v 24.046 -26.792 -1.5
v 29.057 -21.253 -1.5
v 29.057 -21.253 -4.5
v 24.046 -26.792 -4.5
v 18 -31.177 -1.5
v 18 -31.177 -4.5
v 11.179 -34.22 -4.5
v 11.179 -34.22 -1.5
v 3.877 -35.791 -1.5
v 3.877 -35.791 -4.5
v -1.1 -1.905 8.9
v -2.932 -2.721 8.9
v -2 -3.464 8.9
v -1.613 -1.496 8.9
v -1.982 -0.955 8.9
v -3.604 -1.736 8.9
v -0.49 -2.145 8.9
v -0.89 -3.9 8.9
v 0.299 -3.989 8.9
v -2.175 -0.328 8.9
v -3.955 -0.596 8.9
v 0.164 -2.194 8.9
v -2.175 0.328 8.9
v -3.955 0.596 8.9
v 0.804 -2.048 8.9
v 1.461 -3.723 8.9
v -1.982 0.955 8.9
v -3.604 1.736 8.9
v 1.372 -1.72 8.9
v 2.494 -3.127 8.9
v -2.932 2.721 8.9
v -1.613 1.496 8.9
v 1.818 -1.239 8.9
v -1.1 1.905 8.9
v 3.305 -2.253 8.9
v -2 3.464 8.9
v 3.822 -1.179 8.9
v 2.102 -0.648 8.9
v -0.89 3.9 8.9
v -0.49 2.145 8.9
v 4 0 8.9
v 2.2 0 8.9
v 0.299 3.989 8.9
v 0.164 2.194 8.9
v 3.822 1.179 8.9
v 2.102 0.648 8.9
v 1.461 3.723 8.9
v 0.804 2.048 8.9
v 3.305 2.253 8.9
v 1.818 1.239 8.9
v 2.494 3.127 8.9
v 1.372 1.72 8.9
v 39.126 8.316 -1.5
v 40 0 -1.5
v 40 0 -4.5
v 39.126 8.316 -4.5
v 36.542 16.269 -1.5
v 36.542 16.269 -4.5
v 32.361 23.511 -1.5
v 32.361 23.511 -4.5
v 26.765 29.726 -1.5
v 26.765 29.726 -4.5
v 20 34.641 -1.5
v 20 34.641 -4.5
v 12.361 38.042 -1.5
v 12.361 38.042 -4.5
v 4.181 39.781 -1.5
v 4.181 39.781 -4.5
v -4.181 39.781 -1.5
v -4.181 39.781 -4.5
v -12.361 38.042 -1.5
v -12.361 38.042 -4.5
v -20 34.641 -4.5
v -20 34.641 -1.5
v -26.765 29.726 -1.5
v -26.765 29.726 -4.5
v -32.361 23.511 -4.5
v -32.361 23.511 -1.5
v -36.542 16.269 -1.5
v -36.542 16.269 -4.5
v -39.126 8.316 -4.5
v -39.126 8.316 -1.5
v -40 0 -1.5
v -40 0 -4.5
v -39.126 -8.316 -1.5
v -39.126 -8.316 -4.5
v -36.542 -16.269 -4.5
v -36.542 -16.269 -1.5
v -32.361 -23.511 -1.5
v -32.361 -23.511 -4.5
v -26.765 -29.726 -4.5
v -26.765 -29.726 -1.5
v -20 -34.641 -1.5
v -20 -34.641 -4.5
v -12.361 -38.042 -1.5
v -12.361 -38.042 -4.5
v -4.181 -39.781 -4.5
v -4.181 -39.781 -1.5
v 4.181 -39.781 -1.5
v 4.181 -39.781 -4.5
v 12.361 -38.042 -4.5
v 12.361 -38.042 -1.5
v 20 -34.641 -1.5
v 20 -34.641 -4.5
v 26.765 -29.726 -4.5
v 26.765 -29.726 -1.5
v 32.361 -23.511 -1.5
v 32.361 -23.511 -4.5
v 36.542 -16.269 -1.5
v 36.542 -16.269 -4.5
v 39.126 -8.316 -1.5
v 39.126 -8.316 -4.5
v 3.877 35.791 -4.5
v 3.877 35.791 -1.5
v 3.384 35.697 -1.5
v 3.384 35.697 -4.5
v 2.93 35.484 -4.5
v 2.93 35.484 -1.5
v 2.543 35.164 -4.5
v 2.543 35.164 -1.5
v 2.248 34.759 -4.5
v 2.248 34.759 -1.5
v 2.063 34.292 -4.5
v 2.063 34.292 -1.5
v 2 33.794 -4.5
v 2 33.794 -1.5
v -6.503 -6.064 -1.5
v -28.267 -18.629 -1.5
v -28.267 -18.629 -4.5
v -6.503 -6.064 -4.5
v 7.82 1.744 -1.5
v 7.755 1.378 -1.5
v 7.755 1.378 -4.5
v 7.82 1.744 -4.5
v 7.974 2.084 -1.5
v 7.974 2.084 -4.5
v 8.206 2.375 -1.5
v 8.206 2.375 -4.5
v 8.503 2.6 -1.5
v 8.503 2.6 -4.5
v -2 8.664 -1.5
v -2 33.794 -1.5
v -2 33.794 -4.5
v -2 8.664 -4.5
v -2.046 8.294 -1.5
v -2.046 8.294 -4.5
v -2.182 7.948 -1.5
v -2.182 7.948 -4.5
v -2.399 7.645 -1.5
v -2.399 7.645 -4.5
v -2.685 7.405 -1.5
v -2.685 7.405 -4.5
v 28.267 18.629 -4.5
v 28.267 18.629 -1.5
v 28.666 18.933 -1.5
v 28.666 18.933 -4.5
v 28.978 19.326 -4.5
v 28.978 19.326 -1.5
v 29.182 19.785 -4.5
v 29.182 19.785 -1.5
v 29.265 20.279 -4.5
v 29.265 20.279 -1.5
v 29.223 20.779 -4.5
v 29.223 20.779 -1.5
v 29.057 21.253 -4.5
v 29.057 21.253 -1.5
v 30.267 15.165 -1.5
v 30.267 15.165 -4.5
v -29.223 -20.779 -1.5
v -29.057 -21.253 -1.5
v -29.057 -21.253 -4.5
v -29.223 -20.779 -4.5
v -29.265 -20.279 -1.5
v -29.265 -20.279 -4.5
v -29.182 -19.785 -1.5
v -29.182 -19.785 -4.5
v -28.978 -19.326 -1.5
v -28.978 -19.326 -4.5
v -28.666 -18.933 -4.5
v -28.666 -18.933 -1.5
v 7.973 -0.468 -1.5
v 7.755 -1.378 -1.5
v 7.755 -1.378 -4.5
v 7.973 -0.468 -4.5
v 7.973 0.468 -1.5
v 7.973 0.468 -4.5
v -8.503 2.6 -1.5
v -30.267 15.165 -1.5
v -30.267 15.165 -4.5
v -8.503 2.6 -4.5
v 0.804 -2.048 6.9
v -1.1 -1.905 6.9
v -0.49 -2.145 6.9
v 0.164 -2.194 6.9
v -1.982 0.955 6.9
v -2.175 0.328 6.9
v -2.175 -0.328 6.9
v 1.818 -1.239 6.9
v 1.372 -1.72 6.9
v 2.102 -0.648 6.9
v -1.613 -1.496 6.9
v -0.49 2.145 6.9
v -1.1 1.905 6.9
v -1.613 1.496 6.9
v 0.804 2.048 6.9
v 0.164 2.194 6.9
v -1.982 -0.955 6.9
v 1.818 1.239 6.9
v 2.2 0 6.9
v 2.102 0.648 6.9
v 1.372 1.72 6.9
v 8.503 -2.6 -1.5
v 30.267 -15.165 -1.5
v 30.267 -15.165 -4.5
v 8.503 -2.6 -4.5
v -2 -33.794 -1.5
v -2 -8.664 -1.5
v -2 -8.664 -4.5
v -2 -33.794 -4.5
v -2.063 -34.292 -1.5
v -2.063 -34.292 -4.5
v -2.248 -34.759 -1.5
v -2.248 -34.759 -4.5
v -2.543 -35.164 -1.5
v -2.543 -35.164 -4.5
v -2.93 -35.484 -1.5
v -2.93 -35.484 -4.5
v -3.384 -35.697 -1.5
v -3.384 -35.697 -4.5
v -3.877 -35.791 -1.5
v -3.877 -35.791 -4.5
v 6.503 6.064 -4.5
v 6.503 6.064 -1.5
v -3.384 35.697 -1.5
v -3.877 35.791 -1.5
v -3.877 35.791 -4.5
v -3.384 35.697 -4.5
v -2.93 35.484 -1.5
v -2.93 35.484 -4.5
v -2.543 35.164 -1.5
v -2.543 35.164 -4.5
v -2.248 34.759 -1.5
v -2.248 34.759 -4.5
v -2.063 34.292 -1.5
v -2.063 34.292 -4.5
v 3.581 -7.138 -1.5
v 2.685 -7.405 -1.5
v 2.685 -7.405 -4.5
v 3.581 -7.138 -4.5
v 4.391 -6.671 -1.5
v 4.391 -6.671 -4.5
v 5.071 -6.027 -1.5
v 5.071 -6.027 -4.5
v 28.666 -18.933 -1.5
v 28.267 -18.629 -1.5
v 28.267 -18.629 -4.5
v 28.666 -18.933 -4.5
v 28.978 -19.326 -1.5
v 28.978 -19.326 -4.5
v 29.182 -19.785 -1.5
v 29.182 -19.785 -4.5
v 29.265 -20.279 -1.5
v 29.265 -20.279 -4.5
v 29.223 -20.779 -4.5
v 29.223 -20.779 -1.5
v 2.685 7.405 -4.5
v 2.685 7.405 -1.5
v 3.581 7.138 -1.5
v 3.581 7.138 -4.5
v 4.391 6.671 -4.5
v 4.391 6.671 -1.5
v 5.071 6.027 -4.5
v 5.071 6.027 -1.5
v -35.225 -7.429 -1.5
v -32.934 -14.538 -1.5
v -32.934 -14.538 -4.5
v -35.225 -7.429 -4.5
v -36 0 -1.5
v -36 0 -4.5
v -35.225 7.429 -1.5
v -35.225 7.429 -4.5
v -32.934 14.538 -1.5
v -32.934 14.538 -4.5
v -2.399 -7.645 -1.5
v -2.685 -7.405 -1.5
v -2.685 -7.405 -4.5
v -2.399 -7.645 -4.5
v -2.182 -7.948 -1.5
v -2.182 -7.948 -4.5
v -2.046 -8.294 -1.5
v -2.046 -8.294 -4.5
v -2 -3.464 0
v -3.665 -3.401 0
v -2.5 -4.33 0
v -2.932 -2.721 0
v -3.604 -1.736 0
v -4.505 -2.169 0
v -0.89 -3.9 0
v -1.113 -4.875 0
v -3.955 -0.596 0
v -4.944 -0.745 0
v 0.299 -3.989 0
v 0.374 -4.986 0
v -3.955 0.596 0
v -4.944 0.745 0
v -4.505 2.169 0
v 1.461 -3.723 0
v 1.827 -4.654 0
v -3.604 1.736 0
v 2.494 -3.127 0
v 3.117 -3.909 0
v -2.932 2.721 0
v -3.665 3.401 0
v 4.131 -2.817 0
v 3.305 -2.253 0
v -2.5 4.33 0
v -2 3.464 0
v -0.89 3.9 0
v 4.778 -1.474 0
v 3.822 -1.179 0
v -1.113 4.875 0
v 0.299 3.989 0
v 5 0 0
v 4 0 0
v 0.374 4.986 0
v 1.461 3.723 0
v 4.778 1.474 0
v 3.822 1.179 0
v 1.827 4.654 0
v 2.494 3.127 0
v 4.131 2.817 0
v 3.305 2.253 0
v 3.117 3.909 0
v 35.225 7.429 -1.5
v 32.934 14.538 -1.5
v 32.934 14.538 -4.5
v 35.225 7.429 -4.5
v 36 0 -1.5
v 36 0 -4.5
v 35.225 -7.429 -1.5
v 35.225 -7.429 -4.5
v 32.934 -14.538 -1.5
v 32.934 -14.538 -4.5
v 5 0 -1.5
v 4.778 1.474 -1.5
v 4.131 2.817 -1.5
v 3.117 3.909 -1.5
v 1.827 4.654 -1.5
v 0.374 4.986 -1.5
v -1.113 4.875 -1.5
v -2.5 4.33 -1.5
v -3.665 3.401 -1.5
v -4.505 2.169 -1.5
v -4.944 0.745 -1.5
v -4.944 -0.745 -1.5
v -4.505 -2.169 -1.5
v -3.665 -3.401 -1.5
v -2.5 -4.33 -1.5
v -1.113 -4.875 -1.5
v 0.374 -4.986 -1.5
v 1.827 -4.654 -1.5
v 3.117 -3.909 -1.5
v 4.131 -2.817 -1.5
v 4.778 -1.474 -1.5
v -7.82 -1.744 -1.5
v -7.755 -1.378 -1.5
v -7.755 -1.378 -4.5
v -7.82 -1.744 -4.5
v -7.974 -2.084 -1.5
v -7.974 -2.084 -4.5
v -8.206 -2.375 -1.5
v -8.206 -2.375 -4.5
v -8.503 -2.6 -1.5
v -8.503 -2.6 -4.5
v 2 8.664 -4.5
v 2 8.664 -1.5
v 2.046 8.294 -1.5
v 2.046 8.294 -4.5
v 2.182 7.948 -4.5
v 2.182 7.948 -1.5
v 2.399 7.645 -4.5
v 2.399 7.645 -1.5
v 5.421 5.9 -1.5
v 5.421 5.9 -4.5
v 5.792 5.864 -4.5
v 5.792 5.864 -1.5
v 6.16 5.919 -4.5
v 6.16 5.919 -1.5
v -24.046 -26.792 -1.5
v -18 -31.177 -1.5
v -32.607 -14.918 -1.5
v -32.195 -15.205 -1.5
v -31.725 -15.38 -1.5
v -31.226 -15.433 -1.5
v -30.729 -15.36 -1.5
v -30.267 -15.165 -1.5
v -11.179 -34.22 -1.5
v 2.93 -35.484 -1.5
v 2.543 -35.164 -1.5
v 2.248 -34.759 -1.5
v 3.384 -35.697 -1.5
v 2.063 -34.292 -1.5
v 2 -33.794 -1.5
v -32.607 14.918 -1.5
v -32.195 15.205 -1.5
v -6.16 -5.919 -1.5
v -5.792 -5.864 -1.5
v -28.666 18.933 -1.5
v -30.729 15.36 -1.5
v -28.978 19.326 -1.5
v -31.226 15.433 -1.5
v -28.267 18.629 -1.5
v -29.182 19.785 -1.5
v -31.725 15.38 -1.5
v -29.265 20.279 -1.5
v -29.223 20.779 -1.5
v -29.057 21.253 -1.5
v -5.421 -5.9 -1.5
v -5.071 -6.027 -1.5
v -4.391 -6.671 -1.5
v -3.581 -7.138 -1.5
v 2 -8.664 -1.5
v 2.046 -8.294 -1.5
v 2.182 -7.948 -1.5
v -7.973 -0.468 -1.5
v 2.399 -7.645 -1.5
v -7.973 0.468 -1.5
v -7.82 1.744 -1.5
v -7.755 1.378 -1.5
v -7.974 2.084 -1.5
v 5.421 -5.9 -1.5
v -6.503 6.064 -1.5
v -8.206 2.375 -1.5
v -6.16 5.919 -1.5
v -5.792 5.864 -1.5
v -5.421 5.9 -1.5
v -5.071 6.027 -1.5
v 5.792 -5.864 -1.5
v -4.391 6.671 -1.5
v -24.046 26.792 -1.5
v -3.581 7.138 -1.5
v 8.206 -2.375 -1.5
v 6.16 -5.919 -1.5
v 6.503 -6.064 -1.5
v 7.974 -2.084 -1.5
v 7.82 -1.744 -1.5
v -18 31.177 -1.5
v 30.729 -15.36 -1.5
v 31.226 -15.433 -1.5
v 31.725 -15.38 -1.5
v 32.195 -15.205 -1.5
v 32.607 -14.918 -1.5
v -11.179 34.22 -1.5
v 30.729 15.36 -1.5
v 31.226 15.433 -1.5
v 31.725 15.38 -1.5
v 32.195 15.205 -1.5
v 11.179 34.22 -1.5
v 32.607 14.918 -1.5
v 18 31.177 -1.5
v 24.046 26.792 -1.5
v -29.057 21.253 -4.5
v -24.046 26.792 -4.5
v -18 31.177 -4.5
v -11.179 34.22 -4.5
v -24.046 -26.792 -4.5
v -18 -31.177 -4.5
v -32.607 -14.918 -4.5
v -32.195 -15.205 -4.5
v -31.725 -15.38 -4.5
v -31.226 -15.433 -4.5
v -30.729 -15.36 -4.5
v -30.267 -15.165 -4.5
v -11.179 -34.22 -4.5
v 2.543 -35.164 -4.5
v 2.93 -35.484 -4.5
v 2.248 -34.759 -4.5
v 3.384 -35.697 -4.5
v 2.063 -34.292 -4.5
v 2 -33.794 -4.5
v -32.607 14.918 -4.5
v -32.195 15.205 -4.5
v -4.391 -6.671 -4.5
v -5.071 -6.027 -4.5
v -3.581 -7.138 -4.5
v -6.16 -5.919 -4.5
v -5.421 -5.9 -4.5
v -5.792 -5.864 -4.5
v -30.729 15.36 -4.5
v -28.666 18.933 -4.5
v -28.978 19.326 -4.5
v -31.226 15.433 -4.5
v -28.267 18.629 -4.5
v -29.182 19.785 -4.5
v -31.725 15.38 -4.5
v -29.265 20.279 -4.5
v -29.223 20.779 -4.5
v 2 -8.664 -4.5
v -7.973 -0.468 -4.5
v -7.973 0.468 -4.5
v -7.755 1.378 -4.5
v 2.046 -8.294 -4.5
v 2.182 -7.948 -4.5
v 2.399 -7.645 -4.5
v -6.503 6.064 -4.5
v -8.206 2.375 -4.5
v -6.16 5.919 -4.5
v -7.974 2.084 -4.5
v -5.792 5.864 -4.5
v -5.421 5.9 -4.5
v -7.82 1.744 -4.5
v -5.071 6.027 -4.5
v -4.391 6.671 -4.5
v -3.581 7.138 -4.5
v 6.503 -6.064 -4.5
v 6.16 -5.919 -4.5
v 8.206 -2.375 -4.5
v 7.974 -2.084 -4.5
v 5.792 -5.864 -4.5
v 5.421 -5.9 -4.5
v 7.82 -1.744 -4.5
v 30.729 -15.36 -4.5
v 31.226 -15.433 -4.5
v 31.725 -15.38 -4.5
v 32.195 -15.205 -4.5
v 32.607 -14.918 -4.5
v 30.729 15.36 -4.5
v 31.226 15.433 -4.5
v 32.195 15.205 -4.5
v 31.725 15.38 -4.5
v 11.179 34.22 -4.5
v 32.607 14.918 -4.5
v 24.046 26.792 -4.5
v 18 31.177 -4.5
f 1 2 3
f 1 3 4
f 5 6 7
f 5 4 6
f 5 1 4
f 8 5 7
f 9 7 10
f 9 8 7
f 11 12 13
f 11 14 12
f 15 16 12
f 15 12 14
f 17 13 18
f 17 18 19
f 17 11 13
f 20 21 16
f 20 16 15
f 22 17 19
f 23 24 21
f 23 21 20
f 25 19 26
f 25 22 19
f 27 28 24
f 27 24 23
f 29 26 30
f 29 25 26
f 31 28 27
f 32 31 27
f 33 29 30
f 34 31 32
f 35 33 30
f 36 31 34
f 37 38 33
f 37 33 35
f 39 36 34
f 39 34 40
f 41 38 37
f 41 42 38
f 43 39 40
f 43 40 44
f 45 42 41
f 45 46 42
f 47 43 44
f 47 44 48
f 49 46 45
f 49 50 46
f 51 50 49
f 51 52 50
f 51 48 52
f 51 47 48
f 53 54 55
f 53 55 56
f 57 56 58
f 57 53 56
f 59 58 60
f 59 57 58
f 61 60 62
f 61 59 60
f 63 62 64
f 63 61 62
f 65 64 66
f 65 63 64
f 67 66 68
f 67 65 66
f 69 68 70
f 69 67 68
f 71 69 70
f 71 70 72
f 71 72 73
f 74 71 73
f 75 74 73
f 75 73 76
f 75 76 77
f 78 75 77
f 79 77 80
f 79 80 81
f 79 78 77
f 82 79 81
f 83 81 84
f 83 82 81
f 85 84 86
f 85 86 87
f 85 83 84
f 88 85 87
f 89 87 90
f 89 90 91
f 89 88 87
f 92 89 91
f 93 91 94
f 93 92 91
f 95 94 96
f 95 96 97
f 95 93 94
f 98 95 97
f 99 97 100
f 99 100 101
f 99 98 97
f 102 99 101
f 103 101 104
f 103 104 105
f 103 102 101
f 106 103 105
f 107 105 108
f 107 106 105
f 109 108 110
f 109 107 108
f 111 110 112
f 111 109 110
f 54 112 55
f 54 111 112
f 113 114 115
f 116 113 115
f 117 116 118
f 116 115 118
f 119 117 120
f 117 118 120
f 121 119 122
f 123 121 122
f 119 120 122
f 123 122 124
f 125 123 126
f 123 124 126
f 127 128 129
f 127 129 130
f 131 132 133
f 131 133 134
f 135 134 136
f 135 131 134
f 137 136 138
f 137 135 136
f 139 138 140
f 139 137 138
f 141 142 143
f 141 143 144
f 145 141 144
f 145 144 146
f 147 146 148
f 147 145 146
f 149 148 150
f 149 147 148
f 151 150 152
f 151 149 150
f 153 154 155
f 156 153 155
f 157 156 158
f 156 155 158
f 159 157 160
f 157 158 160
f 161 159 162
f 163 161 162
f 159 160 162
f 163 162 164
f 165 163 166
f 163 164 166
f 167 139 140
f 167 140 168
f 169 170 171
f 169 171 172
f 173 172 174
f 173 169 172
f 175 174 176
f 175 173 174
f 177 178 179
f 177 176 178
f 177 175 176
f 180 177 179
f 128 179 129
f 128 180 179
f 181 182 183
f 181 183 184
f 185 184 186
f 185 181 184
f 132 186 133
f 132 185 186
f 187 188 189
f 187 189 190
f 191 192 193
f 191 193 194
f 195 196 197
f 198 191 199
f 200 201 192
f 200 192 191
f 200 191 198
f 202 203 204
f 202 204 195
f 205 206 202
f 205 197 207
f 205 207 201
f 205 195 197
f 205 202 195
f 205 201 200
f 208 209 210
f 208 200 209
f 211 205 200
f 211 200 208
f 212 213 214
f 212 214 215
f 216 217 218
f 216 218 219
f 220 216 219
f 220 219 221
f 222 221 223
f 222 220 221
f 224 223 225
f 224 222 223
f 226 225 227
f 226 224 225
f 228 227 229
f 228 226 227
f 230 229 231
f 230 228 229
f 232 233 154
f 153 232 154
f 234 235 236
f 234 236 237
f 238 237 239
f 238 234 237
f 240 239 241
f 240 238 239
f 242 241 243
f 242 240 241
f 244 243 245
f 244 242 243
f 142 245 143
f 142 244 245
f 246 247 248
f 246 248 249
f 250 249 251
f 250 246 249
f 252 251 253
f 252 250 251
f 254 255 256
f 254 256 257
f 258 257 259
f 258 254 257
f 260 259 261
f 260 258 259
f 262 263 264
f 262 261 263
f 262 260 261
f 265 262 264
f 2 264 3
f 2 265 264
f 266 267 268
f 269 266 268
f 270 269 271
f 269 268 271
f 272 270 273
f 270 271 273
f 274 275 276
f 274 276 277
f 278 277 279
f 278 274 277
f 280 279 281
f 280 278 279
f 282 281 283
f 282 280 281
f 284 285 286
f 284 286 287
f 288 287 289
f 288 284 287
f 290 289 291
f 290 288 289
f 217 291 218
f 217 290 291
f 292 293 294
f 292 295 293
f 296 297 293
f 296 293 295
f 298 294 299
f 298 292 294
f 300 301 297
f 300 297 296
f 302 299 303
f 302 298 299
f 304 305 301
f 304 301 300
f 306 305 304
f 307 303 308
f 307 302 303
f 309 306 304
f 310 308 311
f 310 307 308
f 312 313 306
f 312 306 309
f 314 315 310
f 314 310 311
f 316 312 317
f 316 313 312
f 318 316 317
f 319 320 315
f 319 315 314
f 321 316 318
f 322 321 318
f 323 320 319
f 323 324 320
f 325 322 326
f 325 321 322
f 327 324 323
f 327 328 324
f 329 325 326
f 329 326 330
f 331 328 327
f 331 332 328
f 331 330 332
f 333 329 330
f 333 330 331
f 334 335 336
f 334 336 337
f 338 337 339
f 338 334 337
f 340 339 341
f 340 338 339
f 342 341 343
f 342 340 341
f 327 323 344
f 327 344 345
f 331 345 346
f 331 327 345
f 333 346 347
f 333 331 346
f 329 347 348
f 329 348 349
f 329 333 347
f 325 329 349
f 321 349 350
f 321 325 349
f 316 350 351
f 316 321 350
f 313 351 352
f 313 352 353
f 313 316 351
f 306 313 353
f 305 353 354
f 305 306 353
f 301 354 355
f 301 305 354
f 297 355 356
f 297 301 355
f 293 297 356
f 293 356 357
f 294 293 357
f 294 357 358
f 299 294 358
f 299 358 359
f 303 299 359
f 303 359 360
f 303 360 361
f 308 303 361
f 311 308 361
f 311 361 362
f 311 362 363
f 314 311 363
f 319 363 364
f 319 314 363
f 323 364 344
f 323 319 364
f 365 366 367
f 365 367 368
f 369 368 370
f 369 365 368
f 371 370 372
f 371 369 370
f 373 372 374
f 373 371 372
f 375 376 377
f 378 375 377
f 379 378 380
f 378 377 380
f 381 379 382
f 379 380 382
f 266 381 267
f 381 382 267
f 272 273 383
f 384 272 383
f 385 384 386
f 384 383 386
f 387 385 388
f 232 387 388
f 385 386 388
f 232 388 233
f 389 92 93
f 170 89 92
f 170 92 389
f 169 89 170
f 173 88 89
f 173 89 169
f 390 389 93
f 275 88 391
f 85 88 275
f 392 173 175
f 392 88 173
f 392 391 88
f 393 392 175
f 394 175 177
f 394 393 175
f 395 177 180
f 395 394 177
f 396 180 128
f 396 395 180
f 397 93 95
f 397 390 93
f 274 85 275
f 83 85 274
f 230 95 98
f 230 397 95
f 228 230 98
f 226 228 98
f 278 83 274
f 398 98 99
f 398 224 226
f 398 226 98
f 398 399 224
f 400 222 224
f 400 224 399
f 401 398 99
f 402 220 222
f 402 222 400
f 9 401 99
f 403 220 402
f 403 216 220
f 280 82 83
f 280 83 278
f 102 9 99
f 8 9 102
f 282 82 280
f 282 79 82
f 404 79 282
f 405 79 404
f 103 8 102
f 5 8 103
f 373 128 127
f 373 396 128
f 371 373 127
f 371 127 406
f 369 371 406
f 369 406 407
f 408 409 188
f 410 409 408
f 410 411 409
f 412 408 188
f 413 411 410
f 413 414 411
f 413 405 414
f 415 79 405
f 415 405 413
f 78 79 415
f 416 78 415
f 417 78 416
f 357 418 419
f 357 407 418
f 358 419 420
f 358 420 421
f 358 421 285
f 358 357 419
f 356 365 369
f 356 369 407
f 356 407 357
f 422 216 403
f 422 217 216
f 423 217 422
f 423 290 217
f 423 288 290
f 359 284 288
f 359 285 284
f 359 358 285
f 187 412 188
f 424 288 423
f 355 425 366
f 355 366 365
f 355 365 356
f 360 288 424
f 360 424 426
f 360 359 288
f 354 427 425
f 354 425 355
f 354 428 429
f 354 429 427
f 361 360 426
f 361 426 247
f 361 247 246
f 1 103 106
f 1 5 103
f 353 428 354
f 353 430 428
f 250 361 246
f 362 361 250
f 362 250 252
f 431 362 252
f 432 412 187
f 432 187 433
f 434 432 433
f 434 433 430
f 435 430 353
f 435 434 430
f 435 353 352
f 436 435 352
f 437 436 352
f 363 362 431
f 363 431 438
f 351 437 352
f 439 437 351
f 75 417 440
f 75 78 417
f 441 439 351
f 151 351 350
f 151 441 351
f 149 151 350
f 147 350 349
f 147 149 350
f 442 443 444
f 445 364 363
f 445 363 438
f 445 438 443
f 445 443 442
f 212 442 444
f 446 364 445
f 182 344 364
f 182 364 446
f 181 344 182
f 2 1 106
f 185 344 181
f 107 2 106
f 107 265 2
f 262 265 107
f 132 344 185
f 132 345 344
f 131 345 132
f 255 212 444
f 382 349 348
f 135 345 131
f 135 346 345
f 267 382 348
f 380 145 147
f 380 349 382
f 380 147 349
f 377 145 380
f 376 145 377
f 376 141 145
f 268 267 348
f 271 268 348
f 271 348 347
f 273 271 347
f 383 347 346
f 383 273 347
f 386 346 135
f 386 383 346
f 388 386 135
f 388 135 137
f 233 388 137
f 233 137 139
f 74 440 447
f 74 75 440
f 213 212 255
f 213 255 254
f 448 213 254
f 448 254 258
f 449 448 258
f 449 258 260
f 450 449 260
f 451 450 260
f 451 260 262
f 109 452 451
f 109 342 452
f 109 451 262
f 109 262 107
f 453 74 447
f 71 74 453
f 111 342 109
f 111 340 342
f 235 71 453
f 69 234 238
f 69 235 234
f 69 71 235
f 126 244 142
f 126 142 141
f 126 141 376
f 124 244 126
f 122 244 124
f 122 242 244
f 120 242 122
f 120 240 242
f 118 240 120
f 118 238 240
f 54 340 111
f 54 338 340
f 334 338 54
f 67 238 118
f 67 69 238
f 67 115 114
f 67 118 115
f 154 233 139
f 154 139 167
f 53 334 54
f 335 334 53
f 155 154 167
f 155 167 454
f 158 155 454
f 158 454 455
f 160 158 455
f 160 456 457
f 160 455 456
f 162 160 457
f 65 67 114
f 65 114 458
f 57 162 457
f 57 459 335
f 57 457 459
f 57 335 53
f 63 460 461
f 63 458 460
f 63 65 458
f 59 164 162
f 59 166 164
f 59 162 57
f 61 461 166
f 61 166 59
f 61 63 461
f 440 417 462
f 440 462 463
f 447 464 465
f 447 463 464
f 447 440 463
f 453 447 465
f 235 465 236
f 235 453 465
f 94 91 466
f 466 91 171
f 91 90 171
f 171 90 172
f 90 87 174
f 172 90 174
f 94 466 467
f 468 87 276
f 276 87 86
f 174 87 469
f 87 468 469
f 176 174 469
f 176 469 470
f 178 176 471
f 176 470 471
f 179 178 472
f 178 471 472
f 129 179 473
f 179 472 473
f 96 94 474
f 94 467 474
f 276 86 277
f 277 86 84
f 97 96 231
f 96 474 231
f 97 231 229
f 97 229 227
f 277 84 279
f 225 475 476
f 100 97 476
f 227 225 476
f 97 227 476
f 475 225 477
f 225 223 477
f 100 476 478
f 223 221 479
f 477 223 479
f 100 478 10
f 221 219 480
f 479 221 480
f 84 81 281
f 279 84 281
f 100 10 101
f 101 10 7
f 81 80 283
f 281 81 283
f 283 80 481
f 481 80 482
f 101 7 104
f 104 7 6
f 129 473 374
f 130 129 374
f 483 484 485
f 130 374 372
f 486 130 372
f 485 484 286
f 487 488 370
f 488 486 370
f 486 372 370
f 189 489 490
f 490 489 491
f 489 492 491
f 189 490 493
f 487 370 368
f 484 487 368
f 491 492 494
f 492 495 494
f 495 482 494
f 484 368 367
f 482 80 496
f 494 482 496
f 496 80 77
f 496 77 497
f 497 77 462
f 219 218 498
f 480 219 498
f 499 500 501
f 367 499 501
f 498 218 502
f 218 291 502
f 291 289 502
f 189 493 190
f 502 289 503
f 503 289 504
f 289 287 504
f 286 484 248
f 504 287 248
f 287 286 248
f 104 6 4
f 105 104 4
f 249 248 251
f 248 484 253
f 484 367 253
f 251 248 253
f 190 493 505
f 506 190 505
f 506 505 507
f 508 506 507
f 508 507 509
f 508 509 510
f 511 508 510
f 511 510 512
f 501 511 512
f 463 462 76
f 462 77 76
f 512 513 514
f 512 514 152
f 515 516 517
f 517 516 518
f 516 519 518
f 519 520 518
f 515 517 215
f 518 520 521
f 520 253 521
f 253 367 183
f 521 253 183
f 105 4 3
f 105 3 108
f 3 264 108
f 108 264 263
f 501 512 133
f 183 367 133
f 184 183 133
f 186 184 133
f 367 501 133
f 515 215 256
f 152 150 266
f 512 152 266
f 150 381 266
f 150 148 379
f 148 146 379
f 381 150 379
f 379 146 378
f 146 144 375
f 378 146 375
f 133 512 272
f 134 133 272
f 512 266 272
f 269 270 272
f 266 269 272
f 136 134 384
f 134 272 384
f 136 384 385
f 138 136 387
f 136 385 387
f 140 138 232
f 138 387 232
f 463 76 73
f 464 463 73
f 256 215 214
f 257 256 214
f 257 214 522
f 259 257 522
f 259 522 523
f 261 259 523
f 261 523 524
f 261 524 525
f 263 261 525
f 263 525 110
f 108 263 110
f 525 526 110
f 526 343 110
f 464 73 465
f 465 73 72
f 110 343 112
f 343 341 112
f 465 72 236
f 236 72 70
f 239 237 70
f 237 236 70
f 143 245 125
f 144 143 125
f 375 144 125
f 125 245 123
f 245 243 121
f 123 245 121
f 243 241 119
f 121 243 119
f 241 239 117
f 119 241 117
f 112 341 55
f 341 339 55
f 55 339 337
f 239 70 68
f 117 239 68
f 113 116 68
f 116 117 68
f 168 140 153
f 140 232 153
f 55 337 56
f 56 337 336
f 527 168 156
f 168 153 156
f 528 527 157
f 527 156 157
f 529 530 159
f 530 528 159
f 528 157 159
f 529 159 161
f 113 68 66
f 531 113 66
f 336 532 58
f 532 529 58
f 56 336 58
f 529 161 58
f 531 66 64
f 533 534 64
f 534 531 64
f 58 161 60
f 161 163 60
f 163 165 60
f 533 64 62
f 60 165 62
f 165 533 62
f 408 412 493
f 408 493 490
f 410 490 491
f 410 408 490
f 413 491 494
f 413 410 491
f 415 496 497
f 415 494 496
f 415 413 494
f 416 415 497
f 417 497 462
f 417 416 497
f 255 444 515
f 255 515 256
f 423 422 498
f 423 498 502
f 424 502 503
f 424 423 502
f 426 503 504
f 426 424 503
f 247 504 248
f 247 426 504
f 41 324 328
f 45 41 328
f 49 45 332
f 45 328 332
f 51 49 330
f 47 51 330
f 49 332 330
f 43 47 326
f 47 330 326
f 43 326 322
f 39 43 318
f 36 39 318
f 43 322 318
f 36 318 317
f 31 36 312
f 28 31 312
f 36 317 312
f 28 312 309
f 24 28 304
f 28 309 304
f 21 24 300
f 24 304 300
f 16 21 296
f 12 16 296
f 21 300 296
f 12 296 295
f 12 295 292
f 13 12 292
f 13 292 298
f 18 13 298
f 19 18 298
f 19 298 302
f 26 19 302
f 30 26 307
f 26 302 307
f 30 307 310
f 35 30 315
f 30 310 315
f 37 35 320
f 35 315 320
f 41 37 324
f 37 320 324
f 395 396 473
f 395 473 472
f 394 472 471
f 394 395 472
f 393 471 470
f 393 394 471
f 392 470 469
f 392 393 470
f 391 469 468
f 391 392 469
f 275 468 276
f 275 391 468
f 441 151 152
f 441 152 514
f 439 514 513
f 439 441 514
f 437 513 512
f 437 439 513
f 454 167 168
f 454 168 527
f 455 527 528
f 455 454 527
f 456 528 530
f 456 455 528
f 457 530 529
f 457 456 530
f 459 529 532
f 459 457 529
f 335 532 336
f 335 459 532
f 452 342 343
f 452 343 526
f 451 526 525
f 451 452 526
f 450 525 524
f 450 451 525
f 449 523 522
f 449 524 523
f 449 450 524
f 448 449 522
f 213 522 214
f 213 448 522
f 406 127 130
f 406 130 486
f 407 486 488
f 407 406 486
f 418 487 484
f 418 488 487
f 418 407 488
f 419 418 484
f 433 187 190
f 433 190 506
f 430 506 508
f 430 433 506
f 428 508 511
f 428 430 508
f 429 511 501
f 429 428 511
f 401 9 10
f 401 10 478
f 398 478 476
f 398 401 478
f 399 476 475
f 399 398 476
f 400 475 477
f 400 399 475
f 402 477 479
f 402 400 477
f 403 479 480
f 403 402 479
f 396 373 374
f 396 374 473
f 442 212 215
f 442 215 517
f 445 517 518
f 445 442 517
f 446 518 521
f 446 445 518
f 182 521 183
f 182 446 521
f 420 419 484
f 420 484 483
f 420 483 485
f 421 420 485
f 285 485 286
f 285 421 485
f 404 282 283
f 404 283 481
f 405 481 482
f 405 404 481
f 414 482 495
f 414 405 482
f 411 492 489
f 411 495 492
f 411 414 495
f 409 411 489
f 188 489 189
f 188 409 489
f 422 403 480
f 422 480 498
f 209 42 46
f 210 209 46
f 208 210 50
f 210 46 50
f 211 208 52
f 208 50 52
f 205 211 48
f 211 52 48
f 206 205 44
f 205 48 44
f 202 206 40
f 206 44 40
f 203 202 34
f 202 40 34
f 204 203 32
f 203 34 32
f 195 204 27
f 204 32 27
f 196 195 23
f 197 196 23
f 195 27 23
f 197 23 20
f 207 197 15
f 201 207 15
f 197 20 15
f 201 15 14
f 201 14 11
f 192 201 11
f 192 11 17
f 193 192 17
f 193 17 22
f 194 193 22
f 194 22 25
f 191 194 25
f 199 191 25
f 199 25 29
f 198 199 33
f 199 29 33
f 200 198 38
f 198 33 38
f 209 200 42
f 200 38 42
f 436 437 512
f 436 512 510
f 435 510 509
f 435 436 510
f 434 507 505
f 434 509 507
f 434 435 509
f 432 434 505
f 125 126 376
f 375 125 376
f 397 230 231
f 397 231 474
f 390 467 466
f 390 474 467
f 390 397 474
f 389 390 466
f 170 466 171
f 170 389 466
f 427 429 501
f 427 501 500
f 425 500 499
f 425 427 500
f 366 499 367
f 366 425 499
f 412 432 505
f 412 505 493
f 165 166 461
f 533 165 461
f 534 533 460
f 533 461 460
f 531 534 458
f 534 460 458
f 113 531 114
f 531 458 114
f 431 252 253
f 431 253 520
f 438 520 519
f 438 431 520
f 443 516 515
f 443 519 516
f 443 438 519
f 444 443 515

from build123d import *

# Parameters (mm, degrees)
SKETCH1_R           = 4
BOSS_EXTRUDE1_DEPTH = 8.9
SKETCH2_R           = 5
BOSS_EXTRUDE2_DEPTH = 1.5
BOSS_EXTRUDE3_START = -1.5
SKETCH3_R           = 40
BOSS_EXTRUDE3_DEPTH = 3
CUT_EXTRUDE2_START  = 8.9
SKETCH5_R           = 2.2
CUT_EXTRUDE2_DEPTH  = 2
CUT_EXTRUDE3_DEPTH  = 10


with BuildPart() as part:
    # Sketch1 → Boss-Extrude1 (new body)
    with BuildSketch(Plane.XY):
        Circle(SKETCH1_R)
    extrude(amount=BOSS_EXTRUDE1_DEPTH)

    # Sketch2 → Boss-Extrude2 (add)
    with BuildSketch(Plane.XY):
        Circle(SKETCH2_R)
    extrude(amount=-BOSS_EXTRUDE2_DEPTH)

    # Sketch3 → Boss-Extrude3 (add)
    with BuildSketch(Plane.XY.offset(BOSS_EXTRUDE3_START)):
        Circle(SKETCH3_R)
    extrude(amount=-BOSS_EXTRUDE3_DEPTH)

    # Sketch5 → Cut-Extrude2 (cut)
    with BuildSketch(Plane.XY.offset(CUT_EXTRUDE2_START)):
        Circle(SKETCH5_R)
    extrude(amount=-CUT_EXTRUDE2_DEPTH, mode=Mode.SUBTRACT)

    # Sketch6 → Cut-Extrude3 (cut)
    with BuildSketch(Plane.XY):
        with BuildLine():
            Line((30.266810214, -15.165149948), (8.5033321, -2.6))
            ThreePointArc((8.5033321, -2.6), (7.973884535, -2.083913954), (7.755291283, -1.377602039))
            ThreePointArc((7.755291283, -1.377602039), (8, 0), (7.755291283, 1.377602039))
            ThreePointArc((7.755291283, 1.377602039), (7.973884535, 2.083913954), (8.5033321, 2.6))
            Line((8.5033321, 2.6), (30.266810214, 15.165149948))
            ThreePointArc((30.266810214, 15.165149948), (31.724798793, 15.379954672), (32.934114256, 14.537679256))
            ThreePointArc((32.934114256, 14.537679256), (36, 0), (32.934114256, -14.537679256))
            ThreePointArc((32.934114256, -14.537679256), (31.724798793, -15.379954672), (30.266810214, -15.165149948))
        make_face()
        with BuildLine():
            Line((2, 33.794401511), (2, 8.664101615))
            ThreePointArc((2, 8.664101615), (2.182219844, 7.947543551), (2.684607279, 7.405080285))
            ThreePointArc((2.684607279, 7.405080285), (4, 6.92820323), (5.070684004, 6.027478245))
            ThreePointArc((5.070684004, 6.027478245), (5.791664691, 5.863629597), (6.5033321, 6.064101615))
            Line((6.5033321, 6.064101615), (28.266810214, 18.629251563))
            ThreePointArc((28.266810214, 18.629251563), (29.181830852, 19.784504349), (29.057056676, 21.252939969))
            ThreePointArc((29.057056676, 21.252939969), (18, 31.176914536), (3.87705758, 35.790619225))
            ThreePointArc((3.87705758, 35.790619225), (2.542967941, 35.164459021), (2, 33.794401511))
        make_face()
        with BuildLine():
            Line((2, -33.794401511), (2, -8.664101615))
            ThreePointArc((2, -8.664101615), (2.182219844, -7.947543551), (2.684607279, -7.405080285))
            ThreePointArc((2.684607279, -7.405080285), (4, -6.92820323), (5.070684004, -6.027478245))
            ThreePointArc((5.070684004, -6.027478245), (5.791664691, -5.863629597), (6.5033321, -6.064101615))
            Line((6.5033321, -6.064101615), (28.266810214, -18.629251563))
            ThreePointArc((28.266810214, -18.629251563), (29.181830852, -19.784504349), (29.057056676, -21.252939969))
            ThreePointArc((29.057056676, -21.252939969), (18, -31.176914536), (3.87705758, -35.790619225))
            ThreePointArc((3.87705758, -35.790619225), (2.542967941, -35.164459021), (2, -33.794401511))
        make_face()
        with BuildLine():
            Line((-28.266810214, -18.629251563), (-6.5033321, -6.064101615))
            ThreePointArc((-6.5033321, -6.064101615), (-5.791664691, -5.863629597), (-5.070684004, -6.027478245))
            ThreePointArc((-5.070684004, -6.027478245), (-4, -6.92820323), (-2.684607279, -7.405080285))
            ThreePointArc((-2.684607279, -7.405080285), (-2.182219844, -7.947543551), (-2, -8.664101615))
            Line((-2, -8.664101615), (-2, -33.794401511))
            ThreePointArc((-2, -33.794401511), (-2.542967941, -35.164459021), (-3.87705758, -35.790619225))
            ThreePointArc((-3.87705758, -35.790619225), (-18, -31.176914536), (-29.057056676, -21.252939969))
            ThreePointArc((-29.057056676, -21.252939969), (-29.181830852, -19.784504349), (-28.266810214, -18.629251563))
        make_face()
        with BuildLine():
            Line((-30.266810214, 15.165149948), (-8.5033321, 2.6))
            ThreePointArc((-8.5033321, 2.6), (-7.973884535, 2.083913954), (-7.755291283, 1.377602039))
            ThreePointArc((-7.755291283, 1.377602039), (-8, 0), (-7.755291283, -1.377602039))
            ThreePointArc((-7.755291283, -1.377602039), (-7.973884535, -2.083913954), (-8.5033321, -2.6))
            Line((-8.5033321, -2.6), (-30.266810214, -15.165149948))
            ThreePointArc((-30.266810214, -15.165149948), (-31.724798793, -15.379954672), (-32.934114256, -14.537679256))
            ThreePointArc((-32.934114256, -14.537679256), (-36, 0), (-32.934114256, 14.537679256))
            ThreePointArc((-32.934114256, 14.537679256), (-31.724798793, 15.379954672), (-30.266810214, 15.165149948))
        make_face()
        with BuildLine():
            Line((-2, 33.794401511), (-2, 8.664101615))
            ThreePointArc((-2, 8.664101615), (-2.182219844, 7.947543551), (-2.684607279, 7.405080285))
            ThreePointArc((-2.684607279, 7.405080285), (-4, 6.92820323), (-5.070684004, 6.027478245))
            ThreePointArc((-5.070684004, 6.027478245), (-5.791664691, 5.863629597), (-6.5033321, 6.064101615))
            Line((-6.5033321, 6.064101615), (-28.266810214, 18.629251563))
            ThreePointArc((-28.266810214, 18.629251563), (-29.181830852, 19.784504349), (-29.057056676, 21.252939969))
            ThreePointArc((-29.057056676, 21.252939969), (-18, 31.176914536), (-3.87705758, 35.790619225))
            ThreePointArc((-3.87705758, 35.790619225), (-2.542967941, 35.164459021), (-2, 33.794401511))
        make_face()
    extrude(amount=-CUT_EXTRUDE3_DEPTH, mode=Mode.SUBTRACT)


solid = part.part
